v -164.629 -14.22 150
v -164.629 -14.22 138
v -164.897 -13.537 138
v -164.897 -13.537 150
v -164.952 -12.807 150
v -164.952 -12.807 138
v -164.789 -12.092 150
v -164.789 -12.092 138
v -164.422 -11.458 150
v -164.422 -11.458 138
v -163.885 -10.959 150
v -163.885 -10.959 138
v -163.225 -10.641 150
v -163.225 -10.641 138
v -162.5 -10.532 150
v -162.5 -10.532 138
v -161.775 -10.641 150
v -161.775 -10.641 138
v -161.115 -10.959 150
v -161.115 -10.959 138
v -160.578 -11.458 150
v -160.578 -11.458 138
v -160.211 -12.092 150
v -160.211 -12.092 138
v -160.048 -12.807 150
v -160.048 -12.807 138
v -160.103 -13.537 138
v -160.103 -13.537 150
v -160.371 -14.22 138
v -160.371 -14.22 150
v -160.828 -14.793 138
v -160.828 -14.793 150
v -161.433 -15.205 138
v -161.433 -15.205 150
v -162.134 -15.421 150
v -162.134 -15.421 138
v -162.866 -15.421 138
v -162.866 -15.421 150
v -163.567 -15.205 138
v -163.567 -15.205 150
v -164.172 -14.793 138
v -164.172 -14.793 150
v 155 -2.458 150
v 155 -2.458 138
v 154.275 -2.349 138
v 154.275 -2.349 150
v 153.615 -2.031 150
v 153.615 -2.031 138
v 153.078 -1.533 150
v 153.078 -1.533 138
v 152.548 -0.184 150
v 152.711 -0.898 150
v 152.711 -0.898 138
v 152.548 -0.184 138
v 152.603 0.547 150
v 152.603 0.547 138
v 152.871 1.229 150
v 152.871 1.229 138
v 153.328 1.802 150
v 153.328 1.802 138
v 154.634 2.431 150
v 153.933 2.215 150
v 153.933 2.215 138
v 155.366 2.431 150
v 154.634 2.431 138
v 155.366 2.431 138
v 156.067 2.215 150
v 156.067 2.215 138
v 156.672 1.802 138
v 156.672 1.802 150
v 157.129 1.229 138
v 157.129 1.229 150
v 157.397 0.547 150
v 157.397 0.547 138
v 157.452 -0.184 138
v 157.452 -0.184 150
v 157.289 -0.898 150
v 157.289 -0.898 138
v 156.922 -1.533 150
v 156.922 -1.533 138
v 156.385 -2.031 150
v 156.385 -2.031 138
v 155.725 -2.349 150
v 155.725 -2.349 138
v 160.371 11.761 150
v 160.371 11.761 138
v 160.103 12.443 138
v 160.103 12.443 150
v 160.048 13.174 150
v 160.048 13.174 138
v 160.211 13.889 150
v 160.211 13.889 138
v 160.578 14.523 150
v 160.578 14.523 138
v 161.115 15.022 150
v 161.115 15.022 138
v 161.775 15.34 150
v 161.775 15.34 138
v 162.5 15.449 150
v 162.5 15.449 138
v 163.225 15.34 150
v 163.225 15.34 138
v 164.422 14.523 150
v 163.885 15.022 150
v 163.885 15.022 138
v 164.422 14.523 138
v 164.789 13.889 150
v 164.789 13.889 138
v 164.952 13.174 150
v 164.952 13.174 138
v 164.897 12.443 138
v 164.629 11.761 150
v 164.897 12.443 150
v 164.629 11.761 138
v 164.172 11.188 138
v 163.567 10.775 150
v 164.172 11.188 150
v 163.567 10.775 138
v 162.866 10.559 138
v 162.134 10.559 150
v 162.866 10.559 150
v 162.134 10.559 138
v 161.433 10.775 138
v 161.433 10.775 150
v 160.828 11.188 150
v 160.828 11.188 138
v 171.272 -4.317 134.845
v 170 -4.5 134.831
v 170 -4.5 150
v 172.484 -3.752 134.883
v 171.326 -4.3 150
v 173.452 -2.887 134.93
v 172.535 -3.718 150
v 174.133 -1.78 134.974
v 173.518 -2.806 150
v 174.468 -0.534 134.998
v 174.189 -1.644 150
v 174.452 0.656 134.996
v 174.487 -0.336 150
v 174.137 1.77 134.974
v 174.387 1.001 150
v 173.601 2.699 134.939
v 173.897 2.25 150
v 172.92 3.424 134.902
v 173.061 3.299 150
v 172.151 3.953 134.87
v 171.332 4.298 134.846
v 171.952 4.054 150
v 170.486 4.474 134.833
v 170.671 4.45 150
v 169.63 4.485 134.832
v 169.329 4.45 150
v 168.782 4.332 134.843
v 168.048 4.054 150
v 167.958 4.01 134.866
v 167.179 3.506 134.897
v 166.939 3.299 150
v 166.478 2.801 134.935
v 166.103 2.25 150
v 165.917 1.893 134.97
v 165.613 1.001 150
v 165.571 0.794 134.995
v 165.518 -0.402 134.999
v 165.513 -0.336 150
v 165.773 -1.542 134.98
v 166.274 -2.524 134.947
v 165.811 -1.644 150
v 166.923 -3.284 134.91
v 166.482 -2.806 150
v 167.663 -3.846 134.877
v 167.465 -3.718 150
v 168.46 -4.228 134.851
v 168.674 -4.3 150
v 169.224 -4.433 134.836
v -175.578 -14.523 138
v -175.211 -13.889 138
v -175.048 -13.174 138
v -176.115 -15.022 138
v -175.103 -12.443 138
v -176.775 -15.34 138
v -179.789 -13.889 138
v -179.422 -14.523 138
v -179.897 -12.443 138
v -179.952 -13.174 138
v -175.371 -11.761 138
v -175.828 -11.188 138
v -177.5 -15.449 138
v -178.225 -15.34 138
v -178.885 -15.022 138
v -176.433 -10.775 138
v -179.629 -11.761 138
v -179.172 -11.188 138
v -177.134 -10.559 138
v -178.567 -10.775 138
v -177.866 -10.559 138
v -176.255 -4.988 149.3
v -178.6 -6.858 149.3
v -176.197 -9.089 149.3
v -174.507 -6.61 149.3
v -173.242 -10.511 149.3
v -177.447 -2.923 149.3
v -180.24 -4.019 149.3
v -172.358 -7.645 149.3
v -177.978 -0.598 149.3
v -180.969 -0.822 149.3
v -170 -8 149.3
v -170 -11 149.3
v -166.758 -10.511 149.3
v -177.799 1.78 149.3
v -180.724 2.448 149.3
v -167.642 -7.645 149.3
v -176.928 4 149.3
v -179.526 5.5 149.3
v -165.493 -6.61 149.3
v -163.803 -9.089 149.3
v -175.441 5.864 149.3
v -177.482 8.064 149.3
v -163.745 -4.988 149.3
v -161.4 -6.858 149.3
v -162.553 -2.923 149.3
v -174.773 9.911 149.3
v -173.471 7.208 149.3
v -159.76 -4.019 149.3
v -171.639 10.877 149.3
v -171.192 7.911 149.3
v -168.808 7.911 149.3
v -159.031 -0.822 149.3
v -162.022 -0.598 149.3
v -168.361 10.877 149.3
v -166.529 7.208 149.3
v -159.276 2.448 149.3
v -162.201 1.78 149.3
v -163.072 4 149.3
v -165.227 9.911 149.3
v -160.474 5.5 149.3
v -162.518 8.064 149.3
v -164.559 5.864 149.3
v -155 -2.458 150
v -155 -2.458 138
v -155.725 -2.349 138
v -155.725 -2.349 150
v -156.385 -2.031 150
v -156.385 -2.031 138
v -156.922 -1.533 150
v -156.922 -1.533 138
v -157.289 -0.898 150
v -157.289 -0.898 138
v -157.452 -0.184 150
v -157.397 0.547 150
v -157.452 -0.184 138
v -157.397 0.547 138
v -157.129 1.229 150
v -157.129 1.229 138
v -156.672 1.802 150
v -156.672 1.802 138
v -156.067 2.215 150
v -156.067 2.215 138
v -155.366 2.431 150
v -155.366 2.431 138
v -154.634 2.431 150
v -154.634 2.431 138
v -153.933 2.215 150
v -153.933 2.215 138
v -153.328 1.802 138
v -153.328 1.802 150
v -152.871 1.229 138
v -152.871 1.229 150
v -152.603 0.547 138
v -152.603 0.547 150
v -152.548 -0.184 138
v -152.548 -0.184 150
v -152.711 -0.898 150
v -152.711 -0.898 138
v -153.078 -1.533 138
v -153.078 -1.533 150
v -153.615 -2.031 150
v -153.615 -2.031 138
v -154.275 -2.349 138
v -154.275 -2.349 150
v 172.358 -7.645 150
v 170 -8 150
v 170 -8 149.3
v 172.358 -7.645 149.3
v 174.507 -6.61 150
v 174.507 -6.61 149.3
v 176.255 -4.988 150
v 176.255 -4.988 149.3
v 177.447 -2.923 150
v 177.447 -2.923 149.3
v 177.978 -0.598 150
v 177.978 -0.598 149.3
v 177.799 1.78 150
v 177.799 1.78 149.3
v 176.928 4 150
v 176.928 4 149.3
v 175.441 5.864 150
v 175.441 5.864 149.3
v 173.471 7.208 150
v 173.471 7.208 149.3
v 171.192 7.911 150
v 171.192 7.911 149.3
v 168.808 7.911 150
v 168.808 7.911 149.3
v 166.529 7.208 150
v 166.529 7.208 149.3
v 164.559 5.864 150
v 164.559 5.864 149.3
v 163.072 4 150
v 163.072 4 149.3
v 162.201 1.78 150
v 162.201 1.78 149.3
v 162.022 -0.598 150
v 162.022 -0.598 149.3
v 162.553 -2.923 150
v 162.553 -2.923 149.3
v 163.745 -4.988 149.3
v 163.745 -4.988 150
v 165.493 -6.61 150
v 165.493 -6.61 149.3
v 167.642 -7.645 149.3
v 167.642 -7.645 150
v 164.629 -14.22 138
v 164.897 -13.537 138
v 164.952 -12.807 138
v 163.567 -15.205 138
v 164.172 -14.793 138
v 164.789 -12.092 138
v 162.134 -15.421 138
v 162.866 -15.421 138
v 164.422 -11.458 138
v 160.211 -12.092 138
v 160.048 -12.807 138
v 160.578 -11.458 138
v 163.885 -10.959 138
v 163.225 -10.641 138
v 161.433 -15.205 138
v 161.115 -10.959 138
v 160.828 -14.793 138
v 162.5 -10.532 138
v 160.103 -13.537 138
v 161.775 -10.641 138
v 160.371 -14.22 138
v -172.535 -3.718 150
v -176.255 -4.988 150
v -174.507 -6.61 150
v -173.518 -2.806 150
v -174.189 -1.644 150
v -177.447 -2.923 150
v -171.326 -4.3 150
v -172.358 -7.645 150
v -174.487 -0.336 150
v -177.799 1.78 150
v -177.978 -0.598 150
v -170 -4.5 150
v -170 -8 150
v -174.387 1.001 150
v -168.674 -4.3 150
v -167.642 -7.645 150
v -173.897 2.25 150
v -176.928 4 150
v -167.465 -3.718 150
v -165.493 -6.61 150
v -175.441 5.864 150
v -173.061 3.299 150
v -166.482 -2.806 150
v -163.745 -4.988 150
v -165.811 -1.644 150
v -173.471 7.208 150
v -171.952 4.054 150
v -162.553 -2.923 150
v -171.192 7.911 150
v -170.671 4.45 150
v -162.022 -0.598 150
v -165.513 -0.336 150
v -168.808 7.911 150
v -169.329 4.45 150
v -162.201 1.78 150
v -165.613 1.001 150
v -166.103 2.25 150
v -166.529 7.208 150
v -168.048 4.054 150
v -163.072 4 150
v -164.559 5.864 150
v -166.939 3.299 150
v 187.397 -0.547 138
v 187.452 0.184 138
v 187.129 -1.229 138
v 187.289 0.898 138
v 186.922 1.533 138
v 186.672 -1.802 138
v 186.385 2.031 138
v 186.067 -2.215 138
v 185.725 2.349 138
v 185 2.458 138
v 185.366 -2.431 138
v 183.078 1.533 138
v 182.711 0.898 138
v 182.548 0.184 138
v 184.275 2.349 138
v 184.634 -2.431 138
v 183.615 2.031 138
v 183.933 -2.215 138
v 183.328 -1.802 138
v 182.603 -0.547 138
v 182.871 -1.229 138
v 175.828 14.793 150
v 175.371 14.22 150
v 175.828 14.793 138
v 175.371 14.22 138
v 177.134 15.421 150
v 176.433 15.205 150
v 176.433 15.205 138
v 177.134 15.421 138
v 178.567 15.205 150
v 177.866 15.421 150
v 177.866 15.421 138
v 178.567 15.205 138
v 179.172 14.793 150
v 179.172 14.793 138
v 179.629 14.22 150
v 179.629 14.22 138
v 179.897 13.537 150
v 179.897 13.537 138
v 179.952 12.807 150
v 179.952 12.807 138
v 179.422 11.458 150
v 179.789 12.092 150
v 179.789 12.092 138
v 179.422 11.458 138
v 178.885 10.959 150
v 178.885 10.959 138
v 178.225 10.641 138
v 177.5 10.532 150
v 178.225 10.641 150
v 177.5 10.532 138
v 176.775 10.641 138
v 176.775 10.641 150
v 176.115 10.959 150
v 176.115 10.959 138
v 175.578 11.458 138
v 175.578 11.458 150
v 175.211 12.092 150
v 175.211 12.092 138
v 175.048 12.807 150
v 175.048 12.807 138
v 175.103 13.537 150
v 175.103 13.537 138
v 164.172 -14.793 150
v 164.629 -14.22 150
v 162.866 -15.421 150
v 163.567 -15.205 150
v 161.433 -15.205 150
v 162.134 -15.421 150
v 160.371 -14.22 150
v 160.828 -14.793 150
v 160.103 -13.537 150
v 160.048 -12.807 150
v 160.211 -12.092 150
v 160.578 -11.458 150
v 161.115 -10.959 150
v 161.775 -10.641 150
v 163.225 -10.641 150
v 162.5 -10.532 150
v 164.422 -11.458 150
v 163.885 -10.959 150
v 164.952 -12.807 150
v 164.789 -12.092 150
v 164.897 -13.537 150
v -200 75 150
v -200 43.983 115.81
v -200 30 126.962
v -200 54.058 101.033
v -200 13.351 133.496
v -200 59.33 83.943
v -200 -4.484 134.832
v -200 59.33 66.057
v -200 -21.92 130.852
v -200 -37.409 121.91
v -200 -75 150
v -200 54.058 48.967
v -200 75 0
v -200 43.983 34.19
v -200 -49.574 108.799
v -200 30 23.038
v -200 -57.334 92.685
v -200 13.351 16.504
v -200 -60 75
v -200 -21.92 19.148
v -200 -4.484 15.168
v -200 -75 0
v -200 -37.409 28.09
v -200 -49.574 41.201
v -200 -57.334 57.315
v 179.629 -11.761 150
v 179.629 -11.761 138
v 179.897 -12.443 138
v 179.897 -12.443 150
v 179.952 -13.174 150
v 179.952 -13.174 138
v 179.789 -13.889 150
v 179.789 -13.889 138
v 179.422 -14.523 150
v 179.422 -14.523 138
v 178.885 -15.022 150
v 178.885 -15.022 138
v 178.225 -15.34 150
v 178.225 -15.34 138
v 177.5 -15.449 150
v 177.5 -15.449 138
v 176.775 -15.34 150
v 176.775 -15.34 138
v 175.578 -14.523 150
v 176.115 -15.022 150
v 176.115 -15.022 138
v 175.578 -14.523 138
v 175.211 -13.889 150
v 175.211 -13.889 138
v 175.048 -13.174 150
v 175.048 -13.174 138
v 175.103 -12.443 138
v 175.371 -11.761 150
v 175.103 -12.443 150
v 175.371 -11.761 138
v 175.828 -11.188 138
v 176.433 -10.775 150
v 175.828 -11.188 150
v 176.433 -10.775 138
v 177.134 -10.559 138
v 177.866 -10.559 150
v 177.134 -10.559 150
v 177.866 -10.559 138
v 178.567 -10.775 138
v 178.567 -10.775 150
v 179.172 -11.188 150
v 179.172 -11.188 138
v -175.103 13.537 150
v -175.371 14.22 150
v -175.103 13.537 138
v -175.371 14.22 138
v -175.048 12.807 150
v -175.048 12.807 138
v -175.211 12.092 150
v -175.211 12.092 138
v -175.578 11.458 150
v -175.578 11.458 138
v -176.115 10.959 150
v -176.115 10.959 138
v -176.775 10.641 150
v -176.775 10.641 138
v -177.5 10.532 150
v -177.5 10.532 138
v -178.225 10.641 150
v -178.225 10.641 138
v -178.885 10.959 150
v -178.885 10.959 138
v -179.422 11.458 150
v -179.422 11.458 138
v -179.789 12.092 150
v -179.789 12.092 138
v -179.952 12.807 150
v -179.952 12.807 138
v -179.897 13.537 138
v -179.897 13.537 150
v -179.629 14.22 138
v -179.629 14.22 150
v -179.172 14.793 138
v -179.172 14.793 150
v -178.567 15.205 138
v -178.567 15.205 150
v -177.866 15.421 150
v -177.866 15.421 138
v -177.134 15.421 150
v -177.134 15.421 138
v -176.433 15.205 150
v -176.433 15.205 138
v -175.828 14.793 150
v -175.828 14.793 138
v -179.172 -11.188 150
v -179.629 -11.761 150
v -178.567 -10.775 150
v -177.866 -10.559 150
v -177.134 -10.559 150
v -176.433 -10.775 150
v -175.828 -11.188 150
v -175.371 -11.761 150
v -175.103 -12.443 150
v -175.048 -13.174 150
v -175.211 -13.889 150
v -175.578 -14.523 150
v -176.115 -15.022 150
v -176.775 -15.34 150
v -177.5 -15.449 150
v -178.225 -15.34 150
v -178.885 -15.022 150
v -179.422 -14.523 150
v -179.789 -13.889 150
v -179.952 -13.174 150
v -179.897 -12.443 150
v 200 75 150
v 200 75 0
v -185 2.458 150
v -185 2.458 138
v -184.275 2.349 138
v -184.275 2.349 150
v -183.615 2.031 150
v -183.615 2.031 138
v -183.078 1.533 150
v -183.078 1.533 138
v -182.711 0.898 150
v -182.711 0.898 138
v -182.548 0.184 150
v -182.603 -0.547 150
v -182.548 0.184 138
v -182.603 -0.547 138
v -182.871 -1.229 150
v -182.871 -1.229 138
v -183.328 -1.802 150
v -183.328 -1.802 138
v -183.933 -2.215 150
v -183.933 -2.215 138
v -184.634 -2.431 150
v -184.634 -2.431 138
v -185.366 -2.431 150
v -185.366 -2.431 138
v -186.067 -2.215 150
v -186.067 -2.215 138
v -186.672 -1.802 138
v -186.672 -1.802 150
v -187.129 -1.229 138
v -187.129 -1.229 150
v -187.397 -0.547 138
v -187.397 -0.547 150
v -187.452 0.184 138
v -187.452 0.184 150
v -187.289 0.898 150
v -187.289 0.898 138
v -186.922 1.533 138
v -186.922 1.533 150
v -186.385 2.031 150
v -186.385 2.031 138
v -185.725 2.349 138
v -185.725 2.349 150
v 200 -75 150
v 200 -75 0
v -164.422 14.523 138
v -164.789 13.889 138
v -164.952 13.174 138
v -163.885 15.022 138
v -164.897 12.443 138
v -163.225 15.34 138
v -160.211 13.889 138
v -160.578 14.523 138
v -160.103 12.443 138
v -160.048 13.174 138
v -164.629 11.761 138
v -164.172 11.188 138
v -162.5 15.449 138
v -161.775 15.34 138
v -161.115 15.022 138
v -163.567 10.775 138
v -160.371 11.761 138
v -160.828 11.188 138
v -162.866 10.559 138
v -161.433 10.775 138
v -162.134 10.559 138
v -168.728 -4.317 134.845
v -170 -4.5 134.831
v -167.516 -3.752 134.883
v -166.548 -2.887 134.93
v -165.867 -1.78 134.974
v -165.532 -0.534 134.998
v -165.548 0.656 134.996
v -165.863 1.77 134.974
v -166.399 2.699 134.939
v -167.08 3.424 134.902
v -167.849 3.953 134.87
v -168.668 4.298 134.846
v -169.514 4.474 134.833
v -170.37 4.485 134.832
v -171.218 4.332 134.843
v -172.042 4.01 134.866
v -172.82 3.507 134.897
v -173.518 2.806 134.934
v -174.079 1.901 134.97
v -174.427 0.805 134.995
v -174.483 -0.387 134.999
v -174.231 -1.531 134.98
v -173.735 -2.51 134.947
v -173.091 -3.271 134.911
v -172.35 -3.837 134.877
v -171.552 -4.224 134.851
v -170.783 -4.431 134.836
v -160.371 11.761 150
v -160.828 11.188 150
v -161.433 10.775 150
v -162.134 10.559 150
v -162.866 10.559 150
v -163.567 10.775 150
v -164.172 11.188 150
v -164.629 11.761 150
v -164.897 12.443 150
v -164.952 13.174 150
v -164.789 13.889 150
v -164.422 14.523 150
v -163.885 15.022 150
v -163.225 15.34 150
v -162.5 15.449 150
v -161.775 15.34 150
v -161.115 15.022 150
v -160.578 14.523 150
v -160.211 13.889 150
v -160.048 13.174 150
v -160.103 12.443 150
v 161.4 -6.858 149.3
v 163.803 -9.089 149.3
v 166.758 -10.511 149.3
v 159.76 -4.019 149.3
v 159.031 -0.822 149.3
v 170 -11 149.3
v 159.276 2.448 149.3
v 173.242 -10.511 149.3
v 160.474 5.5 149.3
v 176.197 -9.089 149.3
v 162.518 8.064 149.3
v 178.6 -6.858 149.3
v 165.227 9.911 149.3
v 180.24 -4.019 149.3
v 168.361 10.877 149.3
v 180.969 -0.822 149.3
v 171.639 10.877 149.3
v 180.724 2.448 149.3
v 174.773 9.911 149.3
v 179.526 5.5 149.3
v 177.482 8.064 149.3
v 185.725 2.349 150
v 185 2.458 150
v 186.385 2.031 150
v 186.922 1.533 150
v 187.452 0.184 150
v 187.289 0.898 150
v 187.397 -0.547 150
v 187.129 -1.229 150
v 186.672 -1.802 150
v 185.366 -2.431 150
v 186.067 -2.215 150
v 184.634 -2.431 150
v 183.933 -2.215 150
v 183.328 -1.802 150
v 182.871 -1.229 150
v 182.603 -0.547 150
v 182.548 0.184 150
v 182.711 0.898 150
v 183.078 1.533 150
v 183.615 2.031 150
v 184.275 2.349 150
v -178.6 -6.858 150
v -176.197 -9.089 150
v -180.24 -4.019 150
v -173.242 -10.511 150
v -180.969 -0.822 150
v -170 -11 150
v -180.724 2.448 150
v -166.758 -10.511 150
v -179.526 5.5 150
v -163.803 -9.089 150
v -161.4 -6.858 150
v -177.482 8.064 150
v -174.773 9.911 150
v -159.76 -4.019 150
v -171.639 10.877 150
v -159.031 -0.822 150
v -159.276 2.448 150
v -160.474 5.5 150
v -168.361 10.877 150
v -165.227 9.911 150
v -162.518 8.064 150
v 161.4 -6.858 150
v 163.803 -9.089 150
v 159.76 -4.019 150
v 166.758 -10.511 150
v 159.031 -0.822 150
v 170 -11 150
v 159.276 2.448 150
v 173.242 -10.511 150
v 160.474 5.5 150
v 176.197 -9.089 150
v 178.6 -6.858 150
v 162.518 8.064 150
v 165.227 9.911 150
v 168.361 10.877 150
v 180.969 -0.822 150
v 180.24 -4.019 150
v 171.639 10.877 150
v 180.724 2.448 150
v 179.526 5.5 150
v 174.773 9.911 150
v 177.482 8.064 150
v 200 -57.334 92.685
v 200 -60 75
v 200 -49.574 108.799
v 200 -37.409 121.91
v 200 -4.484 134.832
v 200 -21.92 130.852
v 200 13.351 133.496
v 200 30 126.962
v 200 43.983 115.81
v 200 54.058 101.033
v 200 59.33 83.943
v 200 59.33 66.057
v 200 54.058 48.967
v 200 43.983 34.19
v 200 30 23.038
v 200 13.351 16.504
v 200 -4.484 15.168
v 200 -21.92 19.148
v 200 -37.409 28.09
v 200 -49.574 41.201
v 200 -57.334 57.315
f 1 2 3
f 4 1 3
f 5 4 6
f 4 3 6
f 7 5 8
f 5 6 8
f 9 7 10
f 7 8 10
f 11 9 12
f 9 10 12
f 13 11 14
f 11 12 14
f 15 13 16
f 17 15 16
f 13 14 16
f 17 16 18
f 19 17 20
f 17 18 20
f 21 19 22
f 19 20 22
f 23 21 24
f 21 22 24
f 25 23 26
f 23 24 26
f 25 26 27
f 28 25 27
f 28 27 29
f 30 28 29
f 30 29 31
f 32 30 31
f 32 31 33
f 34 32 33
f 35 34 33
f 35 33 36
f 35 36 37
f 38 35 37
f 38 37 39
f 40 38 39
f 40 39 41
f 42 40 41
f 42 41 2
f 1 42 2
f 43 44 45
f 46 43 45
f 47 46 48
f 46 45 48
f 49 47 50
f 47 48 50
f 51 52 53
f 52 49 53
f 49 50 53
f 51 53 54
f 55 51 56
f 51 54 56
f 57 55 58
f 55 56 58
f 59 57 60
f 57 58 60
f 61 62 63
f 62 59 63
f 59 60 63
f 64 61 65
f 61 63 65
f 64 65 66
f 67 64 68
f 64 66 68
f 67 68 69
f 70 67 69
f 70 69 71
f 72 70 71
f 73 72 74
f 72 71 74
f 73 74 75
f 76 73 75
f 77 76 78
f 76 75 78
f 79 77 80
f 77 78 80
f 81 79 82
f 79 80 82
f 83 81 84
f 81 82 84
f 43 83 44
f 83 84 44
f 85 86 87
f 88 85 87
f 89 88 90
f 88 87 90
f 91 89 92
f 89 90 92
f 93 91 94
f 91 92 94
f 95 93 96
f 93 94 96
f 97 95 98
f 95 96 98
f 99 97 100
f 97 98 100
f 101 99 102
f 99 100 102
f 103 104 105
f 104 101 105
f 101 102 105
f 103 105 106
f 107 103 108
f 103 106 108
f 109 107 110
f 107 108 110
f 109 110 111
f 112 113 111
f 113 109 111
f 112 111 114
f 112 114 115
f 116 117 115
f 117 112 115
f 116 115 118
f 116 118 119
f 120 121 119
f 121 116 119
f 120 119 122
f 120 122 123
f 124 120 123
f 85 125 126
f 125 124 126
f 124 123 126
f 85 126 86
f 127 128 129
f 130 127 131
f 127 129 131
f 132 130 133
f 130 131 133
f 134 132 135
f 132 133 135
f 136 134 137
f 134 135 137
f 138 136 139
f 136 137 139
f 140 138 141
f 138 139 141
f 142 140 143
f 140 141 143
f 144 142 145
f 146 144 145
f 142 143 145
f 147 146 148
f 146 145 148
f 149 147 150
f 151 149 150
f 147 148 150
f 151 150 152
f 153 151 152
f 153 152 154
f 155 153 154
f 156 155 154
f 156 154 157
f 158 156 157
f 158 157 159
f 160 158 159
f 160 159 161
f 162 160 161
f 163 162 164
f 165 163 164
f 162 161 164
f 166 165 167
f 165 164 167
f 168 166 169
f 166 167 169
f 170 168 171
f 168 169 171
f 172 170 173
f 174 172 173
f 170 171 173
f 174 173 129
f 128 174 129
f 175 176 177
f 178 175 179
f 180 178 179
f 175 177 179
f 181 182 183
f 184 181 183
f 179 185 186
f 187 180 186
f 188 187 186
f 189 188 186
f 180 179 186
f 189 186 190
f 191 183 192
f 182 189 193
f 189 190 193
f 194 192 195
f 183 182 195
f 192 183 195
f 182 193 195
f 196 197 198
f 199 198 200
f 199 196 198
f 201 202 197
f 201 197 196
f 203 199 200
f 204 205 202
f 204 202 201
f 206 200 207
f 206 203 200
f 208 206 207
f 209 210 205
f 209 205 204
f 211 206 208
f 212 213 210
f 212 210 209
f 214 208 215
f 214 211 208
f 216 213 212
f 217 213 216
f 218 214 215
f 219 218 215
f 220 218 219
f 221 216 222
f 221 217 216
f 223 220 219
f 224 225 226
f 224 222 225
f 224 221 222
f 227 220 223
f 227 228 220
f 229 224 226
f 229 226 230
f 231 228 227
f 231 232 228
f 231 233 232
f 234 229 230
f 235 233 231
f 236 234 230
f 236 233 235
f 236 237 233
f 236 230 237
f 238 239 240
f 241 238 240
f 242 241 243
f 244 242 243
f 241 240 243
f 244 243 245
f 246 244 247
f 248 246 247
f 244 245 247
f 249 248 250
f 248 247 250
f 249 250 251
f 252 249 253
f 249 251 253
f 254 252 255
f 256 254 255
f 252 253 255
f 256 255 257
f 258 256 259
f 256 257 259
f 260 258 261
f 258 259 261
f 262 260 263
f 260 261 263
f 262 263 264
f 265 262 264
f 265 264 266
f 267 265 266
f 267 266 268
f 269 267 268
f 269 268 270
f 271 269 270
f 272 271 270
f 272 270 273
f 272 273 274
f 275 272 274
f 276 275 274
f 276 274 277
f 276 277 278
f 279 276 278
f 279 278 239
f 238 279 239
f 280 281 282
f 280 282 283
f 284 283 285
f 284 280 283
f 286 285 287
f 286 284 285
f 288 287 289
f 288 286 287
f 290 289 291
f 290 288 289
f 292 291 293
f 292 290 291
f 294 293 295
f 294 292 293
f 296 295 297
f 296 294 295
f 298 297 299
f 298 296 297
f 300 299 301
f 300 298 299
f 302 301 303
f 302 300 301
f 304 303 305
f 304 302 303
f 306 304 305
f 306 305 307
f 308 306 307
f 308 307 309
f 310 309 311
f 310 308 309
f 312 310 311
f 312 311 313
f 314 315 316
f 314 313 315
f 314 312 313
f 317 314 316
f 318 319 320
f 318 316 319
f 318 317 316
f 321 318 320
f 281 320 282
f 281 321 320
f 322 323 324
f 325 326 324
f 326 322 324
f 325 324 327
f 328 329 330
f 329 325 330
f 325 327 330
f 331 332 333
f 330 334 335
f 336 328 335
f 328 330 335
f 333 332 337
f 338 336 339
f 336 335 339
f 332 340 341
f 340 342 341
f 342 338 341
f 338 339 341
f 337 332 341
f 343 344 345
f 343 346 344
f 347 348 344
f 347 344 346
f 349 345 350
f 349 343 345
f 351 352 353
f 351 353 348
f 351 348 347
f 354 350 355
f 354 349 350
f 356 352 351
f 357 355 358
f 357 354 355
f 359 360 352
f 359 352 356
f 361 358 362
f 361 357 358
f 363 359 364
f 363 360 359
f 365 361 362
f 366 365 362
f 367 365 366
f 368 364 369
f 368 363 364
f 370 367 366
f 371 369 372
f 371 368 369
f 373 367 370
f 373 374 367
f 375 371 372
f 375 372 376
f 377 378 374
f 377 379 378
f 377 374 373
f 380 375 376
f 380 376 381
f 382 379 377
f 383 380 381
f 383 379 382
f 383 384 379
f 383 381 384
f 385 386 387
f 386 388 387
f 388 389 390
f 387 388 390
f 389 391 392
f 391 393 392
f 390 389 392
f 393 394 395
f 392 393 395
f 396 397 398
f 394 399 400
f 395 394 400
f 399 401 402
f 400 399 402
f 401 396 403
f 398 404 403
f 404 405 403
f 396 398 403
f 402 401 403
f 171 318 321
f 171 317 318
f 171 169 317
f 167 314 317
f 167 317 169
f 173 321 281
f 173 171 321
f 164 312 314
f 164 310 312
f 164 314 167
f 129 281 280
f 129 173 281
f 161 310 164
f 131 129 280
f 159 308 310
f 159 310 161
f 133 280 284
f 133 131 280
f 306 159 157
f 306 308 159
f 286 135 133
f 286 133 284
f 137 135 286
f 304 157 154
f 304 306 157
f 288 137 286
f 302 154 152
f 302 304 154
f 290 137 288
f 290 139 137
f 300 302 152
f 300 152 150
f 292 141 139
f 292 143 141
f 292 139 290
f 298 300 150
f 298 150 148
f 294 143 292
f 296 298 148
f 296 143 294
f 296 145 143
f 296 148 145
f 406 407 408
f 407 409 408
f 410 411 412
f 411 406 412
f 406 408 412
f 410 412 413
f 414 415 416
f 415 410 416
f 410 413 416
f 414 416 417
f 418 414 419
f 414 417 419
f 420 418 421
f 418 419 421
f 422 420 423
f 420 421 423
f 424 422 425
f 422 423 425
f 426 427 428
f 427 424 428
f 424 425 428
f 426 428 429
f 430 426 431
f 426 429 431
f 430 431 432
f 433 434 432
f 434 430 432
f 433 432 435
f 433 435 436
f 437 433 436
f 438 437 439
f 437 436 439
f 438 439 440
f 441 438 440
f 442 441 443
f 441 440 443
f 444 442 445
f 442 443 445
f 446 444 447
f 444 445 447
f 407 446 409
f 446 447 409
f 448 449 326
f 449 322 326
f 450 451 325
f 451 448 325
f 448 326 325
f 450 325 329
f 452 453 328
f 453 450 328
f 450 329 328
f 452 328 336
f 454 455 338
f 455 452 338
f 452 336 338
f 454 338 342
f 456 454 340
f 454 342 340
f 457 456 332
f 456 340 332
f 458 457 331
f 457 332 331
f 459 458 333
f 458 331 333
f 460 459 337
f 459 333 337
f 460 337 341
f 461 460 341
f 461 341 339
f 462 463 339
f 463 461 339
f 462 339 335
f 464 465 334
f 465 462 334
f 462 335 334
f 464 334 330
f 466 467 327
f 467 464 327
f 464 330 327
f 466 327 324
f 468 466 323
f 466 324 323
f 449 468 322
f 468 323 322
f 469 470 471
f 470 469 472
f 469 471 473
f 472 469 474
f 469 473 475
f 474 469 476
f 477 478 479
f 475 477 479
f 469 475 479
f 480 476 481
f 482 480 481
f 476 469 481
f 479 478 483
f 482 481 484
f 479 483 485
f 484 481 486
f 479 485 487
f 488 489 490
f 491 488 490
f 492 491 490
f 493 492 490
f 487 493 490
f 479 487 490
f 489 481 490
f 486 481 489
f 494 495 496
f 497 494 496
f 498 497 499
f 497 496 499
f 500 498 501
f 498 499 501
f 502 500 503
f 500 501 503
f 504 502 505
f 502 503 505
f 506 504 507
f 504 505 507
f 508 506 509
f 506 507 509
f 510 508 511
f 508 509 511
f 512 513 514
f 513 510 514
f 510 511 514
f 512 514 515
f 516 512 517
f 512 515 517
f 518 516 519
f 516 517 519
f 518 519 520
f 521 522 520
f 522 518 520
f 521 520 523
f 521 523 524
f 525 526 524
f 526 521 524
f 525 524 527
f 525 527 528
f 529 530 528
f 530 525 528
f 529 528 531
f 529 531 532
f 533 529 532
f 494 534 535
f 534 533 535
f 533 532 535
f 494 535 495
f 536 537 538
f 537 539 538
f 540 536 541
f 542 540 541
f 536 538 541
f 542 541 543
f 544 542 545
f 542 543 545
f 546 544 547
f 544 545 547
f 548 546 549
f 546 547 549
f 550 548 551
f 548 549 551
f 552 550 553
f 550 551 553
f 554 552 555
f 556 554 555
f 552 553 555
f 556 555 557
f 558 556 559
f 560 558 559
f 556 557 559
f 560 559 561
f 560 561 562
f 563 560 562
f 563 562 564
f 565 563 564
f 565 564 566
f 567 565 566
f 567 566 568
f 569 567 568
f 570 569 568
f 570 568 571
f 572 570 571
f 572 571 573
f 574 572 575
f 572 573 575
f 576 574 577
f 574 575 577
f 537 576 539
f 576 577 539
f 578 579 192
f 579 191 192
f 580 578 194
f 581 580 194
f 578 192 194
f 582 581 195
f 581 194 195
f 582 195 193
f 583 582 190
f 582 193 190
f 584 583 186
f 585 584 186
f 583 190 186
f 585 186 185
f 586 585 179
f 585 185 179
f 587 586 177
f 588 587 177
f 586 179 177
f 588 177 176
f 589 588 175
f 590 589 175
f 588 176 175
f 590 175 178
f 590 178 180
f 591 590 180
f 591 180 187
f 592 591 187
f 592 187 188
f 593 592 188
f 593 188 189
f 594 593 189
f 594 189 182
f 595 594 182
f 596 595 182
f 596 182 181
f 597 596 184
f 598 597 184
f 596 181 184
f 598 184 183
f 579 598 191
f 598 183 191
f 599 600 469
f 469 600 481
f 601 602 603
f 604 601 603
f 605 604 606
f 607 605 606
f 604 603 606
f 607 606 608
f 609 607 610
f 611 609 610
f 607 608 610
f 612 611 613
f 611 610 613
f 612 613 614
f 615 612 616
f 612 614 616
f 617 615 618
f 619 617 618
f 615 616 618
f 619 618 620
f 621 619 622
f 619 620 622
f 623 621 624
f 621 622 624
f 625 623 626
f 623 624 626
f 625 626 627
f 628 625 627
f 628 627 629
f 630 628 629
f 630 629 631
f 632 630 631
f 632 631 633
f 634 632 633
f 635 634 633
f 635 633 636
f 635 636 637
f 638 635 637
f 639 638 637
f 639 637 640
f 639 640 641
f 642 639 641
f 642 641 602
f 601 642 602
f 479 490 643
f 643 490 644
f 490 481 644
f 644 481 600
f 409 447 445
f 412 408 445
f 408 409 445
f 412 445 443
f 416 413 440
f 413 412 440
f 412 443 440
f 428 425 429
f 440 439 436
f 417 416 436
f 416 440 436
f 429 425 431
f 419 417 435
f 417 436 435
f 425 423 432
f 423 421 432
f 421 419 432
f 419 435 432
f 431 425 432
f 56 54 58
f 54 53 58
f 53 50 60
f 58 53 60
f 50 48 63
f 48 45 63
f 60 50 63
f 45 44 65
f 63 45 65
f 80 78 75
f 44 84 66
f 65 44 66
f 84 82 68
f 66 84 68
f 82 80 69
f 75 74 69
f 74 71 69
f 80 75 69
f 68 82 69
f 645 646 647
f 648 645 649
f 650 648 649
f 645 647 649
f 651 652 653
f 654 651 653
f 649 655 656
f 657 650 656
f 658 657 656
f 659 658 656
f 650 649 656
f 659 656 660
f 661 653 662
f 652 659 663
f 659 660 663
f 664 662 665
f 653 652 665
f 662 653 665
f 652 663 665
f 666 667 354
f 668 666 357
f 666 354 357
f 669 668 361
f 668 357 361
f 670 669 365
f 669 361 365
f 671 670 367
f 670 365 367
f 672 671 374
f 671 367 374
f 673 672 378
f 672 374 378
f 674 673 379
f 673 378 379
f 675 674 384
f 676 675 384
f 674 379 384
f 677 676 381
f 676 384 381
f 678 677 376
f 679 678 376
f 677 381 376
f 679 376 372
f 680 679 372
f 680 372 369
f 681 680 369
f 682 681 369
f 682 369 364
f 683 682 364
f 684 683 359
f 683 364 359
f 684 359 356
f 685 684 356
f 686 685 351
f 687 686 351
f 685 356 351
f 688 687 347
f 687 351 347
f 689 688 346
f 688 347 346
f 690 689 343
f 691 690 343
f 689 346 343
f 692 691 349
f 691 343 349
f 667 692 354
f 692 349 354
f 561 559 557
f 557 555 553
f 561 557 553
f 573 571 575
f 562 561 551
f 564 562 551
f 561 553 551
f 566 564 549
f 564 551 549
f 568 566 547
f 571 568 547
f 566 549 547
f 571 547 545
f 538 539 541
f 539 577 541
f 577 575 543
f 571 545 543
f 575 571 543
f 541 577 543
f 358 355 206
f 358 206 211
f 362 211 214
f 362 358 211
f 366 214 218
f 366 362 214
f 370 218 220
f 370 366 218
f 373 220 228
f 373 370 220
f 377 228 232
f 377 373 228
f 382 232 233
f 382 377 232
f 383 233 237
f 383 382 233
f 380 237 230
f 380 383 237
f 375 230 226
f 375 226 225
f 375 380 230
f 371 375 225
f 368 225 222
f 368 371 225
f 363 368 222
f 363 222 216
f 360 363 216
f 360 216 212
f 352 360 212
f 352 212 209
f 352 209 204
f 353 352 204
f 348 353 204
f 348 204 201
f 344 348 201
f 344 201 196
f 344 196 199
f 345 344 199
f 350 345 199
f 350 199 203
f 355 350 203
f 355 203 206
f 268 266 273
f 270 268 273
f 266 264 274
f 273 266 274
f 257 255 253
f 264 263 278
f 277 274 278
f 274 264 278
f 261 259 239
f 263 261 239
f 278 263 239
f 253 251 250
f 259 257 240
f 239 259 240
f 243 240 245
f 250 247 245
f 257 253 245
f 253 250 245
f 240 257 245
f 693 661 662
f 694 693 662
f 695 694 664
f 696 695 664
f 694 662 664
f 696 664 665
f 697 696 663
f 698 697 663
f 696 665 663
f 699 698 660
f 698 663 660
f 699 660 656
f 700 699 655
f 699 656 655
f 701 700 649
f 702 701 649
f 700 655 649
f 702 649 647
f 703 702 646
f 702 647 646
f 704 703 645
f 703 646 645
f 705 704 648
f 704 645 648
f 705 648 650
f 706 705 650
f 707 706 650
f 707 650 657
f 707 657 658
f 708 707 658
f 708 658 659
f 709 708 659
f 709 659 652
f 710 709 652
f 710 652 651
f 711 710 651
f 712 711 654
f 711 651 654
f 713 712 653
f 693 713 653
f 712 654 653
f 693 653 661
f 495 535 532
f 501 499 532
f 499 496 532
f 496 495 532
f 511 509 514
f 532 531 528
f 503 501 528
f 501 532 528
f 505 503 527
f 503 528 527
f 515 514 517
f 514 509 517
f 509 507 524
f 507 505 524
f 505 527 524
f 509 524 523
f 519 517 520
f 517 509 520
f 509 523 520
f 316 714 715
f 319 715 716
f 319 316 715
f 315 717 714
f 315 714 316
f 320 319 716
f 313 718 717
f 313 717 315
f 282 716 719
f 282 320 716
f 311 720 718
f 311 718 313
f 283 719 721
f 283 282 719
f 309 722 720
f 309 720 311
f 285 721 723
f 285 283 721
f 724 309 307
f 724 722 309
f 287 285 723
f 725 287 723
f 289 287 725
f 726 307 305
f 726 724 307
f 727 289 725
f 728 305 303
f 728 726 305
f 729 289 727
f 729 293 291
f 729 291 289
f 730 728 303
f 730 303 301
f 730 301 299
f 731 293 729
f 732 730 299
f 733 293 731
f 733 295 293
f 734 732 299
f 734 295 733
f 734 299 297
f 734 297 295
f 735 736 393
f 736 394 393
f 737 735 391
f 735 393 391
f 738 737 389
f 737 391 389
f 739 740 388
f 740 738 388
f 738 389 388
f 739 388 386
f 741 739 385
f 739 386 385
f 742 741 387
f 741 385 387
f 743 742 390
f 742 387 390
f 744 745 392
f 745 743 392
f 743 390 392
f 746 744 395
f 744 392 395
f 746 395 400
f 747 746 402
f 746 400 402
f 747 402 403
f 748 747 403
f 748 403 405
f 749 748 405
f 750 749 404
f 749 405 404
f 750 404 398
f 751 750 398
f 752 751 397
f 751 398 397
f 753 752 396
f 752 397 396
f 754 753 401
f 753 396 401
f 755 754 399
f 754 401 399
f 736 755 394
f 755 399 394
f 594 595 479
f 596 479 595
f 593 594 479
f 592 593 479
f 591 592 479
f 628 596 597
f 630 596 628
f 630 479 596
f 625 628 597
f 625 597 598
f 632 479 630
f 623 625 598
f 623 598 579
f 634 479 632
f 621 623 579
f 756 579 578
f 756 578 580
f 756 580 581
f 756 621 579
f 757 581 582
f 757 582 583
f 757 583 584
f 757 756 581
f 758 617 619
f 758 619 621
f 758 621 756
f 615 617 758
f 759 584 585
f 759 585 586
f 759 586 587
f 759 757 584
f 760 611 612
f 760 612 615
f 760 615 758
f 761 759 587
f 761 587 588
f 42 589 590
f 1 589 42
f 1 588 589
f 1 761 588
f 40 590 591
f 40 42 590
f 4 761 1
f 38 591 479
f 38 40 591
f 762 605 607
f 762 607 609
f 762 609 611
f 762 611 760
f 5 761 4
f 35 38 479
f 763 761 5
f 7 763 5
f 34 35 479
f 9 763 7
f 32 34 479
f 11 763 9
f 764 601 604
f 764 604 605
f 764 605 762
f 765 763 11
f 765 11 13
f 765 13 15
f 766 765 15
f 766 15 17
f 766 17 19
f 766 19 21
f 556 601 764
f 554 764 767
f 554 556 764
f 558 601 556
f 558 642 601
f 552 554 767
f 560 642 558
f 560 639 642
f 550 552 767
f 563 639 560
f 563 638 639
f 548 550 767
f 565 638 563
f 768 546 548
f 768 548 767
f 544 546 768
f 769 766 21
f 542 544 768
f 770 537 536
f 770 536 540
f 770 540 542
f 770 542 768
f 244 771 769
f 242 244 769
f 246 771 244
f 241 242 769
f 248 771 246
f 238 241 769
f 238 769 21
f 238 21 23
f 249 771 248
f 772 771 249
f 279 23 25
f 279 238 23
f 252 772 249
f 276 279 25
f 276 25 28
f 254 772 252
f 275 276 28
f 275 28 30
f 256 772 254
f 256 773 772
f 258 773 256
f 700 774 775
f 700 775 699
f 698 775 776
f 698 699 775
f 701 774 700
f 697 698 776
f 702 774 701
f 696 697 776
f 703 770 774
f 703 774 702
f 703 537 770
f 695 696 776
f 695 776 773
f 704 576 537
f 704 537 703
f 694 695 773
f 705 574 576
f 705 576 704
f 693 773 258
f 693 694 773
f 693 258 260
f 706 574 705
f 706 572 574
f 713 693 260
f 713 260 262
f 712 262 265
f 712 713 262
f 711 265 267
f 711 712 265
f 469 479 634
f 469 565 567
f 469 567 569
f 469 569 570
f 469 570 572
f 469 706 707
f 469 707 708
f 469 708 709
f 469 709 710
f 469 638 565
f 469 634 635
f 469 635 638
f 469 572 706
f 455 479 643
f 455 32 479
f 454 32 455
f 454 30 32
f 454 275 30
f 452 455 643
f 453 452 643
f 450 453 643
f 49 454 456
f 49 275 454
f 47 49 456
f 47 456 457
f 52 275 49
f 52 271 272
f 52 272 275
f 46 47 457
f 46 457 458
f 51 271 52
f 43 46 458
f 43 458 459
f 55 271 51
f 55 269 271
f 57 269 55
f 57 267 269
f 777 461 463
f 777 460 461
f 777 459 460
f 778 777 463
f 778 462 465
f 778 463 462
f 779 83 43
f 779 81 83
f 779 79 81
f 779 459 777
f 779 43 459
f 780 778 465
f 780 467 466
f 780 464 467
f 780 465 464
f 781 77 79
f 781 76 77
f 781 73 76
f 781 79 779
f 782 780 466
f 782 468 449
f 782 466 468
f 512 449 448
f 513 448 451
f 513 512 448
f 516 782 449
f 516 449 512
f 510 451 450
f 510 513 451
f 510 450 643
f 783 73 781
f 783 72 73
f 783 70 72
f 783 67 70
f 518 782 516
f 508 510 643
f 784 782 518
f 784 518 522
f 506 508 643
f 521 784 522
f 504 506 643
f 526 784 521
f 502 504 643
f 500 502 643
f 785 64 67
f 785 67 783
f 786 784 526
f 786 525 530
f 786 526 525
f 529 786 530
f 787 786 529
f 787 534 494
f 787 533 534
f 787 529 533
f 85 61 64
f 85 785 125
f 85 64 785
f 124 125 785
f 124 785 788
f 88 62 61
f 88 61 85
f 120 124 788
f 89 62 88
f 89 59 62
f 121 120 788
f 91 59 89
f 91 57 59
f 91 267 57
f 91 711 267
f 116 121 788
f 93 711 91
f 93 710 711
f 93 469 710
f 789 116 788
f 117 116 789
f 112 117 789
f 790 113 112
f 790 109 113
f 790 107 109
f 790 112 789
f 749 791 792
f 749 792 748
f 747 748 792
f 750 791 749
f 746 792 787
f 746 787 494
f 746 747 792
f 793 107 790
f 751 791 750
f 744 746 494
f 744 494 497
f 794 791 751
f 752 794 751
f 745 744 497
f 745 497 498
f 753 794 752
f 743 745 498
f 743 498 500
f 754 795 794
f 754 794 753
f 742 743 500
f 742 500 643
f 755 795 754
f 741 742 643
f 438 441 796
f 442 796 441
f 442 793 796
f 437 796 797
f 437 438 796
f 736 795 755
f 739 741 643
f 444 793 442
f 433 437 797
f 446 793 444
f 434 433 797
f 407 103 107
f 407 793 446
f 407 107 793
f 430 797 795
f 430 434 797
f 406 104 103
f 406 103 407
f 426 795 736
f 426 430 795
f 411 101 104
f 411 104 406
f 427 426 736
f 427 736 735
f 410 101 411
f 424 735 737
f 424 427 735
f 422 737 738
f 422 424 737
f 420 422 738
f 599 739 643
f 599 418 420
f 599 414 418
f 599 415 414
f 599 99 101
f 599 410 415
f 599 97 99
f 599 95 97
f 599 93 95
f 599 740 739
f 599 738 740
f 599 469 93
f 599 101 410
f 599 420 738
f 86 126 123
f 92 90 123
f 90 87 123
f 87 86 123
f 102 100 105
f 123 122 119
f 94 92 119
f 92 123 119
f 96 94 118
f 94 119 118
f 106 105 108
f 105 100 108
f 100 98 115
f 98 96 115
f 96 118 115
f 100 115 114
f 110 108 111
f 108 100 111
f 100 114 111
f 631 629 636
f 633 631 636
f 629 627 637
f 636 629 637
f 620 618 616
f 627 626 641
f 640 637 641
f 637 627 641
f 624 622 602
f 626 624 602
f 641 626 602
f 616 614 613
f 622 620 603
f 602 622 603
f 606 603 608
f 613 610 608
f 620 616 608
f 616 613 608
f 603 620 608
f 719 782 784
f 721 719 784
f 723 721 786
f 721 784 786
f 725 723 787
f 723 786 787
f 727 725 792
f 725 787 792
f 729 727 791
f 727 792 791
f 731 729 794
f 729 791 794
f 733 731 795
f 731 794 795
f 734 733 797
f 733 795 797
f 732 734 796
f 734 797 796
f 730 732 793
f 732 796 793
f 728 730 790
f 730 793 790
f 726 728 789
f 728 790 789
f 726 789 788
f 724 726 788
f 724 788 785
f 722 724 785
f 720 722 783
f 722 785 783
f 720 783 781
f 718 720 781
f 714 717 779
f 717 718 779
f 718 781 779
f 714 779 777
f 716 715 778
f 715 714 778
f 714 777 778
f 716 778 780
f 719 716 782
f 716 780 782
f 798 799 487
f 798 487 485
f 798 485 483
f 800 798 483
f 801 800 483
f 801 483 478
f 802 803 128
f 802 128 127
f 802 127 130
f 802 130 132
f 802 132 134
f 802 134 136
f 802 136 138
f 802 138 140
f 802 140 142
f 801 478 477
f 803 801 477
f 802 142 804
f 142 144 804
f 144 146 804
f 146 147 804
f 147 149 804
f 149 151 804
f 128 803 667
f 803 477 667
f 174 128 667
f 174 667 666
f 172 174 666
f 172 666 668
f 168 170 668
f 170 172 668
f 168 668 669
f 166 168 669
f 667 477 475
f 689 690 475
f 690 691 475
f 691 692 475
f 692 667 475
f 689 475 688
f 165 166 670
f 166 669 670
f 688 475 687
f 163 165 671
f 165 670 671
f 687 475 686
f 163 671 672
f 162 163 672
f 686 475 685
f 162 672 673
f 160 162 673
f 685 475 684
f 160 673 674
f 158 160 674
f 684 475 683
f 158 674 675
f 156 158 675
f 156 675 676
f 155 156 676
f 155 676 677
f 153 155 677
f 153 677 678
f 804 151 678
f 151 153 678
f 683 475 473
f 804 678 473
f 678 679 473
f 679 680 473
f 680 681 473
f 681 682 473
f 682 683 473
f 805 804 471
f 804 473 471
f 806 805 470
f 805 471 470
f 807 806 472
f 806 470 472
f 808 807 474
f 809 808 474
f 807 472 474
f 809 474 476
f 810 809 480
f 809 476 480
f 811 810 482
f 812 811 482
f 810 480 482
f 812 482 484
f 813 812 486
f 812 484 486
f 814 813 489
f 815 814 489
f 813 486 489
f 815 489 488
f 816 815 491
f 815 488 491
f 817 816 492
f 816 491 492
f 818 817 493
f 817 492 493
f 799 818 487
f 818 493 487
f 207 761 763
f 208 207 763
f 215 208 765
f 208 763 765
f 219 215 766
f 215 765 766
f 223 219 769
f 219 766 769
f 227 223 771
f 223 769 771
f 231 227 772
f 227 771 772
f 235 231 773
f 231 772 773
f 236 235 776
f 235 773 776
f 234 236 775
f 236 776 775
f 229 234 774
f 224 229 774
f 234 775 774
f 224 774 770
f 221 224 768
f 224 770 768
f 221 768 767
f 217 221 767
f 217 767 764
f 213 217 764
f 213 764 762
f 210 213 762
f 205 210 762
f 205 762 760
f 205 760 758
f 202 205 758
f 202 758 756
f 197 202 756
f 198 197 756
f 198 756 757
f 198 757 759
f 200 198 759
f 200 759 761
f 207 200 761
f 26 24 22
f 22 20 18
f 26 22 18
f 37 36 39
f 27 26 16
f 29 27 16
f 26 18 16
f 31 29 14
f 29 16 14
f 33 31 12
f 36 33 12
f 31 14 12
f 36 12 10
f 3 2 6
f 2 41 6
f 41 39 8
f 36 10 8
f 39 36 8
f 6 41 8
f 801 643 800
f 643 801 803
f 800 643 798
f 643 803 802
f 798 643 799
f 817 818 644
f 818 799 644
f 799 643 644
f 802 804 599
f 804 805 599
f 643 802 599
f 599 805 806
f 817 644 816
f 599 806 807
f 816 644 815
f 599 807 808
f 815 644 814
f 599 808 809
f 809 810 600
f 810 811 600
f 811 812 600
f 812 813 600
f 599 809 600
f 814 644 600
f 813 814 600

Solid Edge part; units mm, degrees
sketch "Sketch1" plane through (0, 0, 0) normal (0, 0, 1) x (1, 0, 0)
  line L0 (-200, -75) -> (200, -75)
  line L1 (200, -75) -> (200, 75)
  line L2 (200, 75) -> (-200, 75)
  line L3 (-200, 75) -> (-200, -75)
extrude "Protrusion1" add sketch "Sketch1" along normal blind 150
sketch "Sketch2" plane through (-200, 0, 75) normal (-1, 0, 0) x (0, -1, 0)
  circle A0 centre (0, 0) radius 60
  dimension "D1" = 75
  dimension "D2" = 75
extrude "Cutout1" cut sketch "Sketch2" against normal up to next
sketch "Sketch3" plane through (0, 0, 150) normal (0, 0, 1) x (0, -1, 0)
  circle A0 centre (0, -170) radius 4.5
  circle A1 centre (0, 170) radius 4.5
  dimension "D1" = 170
  dimension "D2" = 170
extrude "Cutout2" cut sketch "Sketch3" against normal up to next
hole "Hole_1" at (-155, 0, 150) direction (0, 0, -1) diameter 4.917 depth 12 thread major 6 thread length 10
pattern_circular "Pattern1" count 6 over 360 about axis through (-170, 0, 150) along (0, 0, -1) of "Hole_1"
sketch "Sketch4" plane through (0, 0, 150) normal (0, 0, 1) x (0, -1, 0)
  circle A0 centre (0, -170) radius 11
  circle A1 centre (0, -170) radius 8
extrude "CF16_groove" cut sketch "Sketch4" against normal blind 0.7
mirror "Mirror1" about plane through (0, 0, 0) normal (-1, 0, 0) of "Pattern1", "Hole_1", "CF16_groove"
